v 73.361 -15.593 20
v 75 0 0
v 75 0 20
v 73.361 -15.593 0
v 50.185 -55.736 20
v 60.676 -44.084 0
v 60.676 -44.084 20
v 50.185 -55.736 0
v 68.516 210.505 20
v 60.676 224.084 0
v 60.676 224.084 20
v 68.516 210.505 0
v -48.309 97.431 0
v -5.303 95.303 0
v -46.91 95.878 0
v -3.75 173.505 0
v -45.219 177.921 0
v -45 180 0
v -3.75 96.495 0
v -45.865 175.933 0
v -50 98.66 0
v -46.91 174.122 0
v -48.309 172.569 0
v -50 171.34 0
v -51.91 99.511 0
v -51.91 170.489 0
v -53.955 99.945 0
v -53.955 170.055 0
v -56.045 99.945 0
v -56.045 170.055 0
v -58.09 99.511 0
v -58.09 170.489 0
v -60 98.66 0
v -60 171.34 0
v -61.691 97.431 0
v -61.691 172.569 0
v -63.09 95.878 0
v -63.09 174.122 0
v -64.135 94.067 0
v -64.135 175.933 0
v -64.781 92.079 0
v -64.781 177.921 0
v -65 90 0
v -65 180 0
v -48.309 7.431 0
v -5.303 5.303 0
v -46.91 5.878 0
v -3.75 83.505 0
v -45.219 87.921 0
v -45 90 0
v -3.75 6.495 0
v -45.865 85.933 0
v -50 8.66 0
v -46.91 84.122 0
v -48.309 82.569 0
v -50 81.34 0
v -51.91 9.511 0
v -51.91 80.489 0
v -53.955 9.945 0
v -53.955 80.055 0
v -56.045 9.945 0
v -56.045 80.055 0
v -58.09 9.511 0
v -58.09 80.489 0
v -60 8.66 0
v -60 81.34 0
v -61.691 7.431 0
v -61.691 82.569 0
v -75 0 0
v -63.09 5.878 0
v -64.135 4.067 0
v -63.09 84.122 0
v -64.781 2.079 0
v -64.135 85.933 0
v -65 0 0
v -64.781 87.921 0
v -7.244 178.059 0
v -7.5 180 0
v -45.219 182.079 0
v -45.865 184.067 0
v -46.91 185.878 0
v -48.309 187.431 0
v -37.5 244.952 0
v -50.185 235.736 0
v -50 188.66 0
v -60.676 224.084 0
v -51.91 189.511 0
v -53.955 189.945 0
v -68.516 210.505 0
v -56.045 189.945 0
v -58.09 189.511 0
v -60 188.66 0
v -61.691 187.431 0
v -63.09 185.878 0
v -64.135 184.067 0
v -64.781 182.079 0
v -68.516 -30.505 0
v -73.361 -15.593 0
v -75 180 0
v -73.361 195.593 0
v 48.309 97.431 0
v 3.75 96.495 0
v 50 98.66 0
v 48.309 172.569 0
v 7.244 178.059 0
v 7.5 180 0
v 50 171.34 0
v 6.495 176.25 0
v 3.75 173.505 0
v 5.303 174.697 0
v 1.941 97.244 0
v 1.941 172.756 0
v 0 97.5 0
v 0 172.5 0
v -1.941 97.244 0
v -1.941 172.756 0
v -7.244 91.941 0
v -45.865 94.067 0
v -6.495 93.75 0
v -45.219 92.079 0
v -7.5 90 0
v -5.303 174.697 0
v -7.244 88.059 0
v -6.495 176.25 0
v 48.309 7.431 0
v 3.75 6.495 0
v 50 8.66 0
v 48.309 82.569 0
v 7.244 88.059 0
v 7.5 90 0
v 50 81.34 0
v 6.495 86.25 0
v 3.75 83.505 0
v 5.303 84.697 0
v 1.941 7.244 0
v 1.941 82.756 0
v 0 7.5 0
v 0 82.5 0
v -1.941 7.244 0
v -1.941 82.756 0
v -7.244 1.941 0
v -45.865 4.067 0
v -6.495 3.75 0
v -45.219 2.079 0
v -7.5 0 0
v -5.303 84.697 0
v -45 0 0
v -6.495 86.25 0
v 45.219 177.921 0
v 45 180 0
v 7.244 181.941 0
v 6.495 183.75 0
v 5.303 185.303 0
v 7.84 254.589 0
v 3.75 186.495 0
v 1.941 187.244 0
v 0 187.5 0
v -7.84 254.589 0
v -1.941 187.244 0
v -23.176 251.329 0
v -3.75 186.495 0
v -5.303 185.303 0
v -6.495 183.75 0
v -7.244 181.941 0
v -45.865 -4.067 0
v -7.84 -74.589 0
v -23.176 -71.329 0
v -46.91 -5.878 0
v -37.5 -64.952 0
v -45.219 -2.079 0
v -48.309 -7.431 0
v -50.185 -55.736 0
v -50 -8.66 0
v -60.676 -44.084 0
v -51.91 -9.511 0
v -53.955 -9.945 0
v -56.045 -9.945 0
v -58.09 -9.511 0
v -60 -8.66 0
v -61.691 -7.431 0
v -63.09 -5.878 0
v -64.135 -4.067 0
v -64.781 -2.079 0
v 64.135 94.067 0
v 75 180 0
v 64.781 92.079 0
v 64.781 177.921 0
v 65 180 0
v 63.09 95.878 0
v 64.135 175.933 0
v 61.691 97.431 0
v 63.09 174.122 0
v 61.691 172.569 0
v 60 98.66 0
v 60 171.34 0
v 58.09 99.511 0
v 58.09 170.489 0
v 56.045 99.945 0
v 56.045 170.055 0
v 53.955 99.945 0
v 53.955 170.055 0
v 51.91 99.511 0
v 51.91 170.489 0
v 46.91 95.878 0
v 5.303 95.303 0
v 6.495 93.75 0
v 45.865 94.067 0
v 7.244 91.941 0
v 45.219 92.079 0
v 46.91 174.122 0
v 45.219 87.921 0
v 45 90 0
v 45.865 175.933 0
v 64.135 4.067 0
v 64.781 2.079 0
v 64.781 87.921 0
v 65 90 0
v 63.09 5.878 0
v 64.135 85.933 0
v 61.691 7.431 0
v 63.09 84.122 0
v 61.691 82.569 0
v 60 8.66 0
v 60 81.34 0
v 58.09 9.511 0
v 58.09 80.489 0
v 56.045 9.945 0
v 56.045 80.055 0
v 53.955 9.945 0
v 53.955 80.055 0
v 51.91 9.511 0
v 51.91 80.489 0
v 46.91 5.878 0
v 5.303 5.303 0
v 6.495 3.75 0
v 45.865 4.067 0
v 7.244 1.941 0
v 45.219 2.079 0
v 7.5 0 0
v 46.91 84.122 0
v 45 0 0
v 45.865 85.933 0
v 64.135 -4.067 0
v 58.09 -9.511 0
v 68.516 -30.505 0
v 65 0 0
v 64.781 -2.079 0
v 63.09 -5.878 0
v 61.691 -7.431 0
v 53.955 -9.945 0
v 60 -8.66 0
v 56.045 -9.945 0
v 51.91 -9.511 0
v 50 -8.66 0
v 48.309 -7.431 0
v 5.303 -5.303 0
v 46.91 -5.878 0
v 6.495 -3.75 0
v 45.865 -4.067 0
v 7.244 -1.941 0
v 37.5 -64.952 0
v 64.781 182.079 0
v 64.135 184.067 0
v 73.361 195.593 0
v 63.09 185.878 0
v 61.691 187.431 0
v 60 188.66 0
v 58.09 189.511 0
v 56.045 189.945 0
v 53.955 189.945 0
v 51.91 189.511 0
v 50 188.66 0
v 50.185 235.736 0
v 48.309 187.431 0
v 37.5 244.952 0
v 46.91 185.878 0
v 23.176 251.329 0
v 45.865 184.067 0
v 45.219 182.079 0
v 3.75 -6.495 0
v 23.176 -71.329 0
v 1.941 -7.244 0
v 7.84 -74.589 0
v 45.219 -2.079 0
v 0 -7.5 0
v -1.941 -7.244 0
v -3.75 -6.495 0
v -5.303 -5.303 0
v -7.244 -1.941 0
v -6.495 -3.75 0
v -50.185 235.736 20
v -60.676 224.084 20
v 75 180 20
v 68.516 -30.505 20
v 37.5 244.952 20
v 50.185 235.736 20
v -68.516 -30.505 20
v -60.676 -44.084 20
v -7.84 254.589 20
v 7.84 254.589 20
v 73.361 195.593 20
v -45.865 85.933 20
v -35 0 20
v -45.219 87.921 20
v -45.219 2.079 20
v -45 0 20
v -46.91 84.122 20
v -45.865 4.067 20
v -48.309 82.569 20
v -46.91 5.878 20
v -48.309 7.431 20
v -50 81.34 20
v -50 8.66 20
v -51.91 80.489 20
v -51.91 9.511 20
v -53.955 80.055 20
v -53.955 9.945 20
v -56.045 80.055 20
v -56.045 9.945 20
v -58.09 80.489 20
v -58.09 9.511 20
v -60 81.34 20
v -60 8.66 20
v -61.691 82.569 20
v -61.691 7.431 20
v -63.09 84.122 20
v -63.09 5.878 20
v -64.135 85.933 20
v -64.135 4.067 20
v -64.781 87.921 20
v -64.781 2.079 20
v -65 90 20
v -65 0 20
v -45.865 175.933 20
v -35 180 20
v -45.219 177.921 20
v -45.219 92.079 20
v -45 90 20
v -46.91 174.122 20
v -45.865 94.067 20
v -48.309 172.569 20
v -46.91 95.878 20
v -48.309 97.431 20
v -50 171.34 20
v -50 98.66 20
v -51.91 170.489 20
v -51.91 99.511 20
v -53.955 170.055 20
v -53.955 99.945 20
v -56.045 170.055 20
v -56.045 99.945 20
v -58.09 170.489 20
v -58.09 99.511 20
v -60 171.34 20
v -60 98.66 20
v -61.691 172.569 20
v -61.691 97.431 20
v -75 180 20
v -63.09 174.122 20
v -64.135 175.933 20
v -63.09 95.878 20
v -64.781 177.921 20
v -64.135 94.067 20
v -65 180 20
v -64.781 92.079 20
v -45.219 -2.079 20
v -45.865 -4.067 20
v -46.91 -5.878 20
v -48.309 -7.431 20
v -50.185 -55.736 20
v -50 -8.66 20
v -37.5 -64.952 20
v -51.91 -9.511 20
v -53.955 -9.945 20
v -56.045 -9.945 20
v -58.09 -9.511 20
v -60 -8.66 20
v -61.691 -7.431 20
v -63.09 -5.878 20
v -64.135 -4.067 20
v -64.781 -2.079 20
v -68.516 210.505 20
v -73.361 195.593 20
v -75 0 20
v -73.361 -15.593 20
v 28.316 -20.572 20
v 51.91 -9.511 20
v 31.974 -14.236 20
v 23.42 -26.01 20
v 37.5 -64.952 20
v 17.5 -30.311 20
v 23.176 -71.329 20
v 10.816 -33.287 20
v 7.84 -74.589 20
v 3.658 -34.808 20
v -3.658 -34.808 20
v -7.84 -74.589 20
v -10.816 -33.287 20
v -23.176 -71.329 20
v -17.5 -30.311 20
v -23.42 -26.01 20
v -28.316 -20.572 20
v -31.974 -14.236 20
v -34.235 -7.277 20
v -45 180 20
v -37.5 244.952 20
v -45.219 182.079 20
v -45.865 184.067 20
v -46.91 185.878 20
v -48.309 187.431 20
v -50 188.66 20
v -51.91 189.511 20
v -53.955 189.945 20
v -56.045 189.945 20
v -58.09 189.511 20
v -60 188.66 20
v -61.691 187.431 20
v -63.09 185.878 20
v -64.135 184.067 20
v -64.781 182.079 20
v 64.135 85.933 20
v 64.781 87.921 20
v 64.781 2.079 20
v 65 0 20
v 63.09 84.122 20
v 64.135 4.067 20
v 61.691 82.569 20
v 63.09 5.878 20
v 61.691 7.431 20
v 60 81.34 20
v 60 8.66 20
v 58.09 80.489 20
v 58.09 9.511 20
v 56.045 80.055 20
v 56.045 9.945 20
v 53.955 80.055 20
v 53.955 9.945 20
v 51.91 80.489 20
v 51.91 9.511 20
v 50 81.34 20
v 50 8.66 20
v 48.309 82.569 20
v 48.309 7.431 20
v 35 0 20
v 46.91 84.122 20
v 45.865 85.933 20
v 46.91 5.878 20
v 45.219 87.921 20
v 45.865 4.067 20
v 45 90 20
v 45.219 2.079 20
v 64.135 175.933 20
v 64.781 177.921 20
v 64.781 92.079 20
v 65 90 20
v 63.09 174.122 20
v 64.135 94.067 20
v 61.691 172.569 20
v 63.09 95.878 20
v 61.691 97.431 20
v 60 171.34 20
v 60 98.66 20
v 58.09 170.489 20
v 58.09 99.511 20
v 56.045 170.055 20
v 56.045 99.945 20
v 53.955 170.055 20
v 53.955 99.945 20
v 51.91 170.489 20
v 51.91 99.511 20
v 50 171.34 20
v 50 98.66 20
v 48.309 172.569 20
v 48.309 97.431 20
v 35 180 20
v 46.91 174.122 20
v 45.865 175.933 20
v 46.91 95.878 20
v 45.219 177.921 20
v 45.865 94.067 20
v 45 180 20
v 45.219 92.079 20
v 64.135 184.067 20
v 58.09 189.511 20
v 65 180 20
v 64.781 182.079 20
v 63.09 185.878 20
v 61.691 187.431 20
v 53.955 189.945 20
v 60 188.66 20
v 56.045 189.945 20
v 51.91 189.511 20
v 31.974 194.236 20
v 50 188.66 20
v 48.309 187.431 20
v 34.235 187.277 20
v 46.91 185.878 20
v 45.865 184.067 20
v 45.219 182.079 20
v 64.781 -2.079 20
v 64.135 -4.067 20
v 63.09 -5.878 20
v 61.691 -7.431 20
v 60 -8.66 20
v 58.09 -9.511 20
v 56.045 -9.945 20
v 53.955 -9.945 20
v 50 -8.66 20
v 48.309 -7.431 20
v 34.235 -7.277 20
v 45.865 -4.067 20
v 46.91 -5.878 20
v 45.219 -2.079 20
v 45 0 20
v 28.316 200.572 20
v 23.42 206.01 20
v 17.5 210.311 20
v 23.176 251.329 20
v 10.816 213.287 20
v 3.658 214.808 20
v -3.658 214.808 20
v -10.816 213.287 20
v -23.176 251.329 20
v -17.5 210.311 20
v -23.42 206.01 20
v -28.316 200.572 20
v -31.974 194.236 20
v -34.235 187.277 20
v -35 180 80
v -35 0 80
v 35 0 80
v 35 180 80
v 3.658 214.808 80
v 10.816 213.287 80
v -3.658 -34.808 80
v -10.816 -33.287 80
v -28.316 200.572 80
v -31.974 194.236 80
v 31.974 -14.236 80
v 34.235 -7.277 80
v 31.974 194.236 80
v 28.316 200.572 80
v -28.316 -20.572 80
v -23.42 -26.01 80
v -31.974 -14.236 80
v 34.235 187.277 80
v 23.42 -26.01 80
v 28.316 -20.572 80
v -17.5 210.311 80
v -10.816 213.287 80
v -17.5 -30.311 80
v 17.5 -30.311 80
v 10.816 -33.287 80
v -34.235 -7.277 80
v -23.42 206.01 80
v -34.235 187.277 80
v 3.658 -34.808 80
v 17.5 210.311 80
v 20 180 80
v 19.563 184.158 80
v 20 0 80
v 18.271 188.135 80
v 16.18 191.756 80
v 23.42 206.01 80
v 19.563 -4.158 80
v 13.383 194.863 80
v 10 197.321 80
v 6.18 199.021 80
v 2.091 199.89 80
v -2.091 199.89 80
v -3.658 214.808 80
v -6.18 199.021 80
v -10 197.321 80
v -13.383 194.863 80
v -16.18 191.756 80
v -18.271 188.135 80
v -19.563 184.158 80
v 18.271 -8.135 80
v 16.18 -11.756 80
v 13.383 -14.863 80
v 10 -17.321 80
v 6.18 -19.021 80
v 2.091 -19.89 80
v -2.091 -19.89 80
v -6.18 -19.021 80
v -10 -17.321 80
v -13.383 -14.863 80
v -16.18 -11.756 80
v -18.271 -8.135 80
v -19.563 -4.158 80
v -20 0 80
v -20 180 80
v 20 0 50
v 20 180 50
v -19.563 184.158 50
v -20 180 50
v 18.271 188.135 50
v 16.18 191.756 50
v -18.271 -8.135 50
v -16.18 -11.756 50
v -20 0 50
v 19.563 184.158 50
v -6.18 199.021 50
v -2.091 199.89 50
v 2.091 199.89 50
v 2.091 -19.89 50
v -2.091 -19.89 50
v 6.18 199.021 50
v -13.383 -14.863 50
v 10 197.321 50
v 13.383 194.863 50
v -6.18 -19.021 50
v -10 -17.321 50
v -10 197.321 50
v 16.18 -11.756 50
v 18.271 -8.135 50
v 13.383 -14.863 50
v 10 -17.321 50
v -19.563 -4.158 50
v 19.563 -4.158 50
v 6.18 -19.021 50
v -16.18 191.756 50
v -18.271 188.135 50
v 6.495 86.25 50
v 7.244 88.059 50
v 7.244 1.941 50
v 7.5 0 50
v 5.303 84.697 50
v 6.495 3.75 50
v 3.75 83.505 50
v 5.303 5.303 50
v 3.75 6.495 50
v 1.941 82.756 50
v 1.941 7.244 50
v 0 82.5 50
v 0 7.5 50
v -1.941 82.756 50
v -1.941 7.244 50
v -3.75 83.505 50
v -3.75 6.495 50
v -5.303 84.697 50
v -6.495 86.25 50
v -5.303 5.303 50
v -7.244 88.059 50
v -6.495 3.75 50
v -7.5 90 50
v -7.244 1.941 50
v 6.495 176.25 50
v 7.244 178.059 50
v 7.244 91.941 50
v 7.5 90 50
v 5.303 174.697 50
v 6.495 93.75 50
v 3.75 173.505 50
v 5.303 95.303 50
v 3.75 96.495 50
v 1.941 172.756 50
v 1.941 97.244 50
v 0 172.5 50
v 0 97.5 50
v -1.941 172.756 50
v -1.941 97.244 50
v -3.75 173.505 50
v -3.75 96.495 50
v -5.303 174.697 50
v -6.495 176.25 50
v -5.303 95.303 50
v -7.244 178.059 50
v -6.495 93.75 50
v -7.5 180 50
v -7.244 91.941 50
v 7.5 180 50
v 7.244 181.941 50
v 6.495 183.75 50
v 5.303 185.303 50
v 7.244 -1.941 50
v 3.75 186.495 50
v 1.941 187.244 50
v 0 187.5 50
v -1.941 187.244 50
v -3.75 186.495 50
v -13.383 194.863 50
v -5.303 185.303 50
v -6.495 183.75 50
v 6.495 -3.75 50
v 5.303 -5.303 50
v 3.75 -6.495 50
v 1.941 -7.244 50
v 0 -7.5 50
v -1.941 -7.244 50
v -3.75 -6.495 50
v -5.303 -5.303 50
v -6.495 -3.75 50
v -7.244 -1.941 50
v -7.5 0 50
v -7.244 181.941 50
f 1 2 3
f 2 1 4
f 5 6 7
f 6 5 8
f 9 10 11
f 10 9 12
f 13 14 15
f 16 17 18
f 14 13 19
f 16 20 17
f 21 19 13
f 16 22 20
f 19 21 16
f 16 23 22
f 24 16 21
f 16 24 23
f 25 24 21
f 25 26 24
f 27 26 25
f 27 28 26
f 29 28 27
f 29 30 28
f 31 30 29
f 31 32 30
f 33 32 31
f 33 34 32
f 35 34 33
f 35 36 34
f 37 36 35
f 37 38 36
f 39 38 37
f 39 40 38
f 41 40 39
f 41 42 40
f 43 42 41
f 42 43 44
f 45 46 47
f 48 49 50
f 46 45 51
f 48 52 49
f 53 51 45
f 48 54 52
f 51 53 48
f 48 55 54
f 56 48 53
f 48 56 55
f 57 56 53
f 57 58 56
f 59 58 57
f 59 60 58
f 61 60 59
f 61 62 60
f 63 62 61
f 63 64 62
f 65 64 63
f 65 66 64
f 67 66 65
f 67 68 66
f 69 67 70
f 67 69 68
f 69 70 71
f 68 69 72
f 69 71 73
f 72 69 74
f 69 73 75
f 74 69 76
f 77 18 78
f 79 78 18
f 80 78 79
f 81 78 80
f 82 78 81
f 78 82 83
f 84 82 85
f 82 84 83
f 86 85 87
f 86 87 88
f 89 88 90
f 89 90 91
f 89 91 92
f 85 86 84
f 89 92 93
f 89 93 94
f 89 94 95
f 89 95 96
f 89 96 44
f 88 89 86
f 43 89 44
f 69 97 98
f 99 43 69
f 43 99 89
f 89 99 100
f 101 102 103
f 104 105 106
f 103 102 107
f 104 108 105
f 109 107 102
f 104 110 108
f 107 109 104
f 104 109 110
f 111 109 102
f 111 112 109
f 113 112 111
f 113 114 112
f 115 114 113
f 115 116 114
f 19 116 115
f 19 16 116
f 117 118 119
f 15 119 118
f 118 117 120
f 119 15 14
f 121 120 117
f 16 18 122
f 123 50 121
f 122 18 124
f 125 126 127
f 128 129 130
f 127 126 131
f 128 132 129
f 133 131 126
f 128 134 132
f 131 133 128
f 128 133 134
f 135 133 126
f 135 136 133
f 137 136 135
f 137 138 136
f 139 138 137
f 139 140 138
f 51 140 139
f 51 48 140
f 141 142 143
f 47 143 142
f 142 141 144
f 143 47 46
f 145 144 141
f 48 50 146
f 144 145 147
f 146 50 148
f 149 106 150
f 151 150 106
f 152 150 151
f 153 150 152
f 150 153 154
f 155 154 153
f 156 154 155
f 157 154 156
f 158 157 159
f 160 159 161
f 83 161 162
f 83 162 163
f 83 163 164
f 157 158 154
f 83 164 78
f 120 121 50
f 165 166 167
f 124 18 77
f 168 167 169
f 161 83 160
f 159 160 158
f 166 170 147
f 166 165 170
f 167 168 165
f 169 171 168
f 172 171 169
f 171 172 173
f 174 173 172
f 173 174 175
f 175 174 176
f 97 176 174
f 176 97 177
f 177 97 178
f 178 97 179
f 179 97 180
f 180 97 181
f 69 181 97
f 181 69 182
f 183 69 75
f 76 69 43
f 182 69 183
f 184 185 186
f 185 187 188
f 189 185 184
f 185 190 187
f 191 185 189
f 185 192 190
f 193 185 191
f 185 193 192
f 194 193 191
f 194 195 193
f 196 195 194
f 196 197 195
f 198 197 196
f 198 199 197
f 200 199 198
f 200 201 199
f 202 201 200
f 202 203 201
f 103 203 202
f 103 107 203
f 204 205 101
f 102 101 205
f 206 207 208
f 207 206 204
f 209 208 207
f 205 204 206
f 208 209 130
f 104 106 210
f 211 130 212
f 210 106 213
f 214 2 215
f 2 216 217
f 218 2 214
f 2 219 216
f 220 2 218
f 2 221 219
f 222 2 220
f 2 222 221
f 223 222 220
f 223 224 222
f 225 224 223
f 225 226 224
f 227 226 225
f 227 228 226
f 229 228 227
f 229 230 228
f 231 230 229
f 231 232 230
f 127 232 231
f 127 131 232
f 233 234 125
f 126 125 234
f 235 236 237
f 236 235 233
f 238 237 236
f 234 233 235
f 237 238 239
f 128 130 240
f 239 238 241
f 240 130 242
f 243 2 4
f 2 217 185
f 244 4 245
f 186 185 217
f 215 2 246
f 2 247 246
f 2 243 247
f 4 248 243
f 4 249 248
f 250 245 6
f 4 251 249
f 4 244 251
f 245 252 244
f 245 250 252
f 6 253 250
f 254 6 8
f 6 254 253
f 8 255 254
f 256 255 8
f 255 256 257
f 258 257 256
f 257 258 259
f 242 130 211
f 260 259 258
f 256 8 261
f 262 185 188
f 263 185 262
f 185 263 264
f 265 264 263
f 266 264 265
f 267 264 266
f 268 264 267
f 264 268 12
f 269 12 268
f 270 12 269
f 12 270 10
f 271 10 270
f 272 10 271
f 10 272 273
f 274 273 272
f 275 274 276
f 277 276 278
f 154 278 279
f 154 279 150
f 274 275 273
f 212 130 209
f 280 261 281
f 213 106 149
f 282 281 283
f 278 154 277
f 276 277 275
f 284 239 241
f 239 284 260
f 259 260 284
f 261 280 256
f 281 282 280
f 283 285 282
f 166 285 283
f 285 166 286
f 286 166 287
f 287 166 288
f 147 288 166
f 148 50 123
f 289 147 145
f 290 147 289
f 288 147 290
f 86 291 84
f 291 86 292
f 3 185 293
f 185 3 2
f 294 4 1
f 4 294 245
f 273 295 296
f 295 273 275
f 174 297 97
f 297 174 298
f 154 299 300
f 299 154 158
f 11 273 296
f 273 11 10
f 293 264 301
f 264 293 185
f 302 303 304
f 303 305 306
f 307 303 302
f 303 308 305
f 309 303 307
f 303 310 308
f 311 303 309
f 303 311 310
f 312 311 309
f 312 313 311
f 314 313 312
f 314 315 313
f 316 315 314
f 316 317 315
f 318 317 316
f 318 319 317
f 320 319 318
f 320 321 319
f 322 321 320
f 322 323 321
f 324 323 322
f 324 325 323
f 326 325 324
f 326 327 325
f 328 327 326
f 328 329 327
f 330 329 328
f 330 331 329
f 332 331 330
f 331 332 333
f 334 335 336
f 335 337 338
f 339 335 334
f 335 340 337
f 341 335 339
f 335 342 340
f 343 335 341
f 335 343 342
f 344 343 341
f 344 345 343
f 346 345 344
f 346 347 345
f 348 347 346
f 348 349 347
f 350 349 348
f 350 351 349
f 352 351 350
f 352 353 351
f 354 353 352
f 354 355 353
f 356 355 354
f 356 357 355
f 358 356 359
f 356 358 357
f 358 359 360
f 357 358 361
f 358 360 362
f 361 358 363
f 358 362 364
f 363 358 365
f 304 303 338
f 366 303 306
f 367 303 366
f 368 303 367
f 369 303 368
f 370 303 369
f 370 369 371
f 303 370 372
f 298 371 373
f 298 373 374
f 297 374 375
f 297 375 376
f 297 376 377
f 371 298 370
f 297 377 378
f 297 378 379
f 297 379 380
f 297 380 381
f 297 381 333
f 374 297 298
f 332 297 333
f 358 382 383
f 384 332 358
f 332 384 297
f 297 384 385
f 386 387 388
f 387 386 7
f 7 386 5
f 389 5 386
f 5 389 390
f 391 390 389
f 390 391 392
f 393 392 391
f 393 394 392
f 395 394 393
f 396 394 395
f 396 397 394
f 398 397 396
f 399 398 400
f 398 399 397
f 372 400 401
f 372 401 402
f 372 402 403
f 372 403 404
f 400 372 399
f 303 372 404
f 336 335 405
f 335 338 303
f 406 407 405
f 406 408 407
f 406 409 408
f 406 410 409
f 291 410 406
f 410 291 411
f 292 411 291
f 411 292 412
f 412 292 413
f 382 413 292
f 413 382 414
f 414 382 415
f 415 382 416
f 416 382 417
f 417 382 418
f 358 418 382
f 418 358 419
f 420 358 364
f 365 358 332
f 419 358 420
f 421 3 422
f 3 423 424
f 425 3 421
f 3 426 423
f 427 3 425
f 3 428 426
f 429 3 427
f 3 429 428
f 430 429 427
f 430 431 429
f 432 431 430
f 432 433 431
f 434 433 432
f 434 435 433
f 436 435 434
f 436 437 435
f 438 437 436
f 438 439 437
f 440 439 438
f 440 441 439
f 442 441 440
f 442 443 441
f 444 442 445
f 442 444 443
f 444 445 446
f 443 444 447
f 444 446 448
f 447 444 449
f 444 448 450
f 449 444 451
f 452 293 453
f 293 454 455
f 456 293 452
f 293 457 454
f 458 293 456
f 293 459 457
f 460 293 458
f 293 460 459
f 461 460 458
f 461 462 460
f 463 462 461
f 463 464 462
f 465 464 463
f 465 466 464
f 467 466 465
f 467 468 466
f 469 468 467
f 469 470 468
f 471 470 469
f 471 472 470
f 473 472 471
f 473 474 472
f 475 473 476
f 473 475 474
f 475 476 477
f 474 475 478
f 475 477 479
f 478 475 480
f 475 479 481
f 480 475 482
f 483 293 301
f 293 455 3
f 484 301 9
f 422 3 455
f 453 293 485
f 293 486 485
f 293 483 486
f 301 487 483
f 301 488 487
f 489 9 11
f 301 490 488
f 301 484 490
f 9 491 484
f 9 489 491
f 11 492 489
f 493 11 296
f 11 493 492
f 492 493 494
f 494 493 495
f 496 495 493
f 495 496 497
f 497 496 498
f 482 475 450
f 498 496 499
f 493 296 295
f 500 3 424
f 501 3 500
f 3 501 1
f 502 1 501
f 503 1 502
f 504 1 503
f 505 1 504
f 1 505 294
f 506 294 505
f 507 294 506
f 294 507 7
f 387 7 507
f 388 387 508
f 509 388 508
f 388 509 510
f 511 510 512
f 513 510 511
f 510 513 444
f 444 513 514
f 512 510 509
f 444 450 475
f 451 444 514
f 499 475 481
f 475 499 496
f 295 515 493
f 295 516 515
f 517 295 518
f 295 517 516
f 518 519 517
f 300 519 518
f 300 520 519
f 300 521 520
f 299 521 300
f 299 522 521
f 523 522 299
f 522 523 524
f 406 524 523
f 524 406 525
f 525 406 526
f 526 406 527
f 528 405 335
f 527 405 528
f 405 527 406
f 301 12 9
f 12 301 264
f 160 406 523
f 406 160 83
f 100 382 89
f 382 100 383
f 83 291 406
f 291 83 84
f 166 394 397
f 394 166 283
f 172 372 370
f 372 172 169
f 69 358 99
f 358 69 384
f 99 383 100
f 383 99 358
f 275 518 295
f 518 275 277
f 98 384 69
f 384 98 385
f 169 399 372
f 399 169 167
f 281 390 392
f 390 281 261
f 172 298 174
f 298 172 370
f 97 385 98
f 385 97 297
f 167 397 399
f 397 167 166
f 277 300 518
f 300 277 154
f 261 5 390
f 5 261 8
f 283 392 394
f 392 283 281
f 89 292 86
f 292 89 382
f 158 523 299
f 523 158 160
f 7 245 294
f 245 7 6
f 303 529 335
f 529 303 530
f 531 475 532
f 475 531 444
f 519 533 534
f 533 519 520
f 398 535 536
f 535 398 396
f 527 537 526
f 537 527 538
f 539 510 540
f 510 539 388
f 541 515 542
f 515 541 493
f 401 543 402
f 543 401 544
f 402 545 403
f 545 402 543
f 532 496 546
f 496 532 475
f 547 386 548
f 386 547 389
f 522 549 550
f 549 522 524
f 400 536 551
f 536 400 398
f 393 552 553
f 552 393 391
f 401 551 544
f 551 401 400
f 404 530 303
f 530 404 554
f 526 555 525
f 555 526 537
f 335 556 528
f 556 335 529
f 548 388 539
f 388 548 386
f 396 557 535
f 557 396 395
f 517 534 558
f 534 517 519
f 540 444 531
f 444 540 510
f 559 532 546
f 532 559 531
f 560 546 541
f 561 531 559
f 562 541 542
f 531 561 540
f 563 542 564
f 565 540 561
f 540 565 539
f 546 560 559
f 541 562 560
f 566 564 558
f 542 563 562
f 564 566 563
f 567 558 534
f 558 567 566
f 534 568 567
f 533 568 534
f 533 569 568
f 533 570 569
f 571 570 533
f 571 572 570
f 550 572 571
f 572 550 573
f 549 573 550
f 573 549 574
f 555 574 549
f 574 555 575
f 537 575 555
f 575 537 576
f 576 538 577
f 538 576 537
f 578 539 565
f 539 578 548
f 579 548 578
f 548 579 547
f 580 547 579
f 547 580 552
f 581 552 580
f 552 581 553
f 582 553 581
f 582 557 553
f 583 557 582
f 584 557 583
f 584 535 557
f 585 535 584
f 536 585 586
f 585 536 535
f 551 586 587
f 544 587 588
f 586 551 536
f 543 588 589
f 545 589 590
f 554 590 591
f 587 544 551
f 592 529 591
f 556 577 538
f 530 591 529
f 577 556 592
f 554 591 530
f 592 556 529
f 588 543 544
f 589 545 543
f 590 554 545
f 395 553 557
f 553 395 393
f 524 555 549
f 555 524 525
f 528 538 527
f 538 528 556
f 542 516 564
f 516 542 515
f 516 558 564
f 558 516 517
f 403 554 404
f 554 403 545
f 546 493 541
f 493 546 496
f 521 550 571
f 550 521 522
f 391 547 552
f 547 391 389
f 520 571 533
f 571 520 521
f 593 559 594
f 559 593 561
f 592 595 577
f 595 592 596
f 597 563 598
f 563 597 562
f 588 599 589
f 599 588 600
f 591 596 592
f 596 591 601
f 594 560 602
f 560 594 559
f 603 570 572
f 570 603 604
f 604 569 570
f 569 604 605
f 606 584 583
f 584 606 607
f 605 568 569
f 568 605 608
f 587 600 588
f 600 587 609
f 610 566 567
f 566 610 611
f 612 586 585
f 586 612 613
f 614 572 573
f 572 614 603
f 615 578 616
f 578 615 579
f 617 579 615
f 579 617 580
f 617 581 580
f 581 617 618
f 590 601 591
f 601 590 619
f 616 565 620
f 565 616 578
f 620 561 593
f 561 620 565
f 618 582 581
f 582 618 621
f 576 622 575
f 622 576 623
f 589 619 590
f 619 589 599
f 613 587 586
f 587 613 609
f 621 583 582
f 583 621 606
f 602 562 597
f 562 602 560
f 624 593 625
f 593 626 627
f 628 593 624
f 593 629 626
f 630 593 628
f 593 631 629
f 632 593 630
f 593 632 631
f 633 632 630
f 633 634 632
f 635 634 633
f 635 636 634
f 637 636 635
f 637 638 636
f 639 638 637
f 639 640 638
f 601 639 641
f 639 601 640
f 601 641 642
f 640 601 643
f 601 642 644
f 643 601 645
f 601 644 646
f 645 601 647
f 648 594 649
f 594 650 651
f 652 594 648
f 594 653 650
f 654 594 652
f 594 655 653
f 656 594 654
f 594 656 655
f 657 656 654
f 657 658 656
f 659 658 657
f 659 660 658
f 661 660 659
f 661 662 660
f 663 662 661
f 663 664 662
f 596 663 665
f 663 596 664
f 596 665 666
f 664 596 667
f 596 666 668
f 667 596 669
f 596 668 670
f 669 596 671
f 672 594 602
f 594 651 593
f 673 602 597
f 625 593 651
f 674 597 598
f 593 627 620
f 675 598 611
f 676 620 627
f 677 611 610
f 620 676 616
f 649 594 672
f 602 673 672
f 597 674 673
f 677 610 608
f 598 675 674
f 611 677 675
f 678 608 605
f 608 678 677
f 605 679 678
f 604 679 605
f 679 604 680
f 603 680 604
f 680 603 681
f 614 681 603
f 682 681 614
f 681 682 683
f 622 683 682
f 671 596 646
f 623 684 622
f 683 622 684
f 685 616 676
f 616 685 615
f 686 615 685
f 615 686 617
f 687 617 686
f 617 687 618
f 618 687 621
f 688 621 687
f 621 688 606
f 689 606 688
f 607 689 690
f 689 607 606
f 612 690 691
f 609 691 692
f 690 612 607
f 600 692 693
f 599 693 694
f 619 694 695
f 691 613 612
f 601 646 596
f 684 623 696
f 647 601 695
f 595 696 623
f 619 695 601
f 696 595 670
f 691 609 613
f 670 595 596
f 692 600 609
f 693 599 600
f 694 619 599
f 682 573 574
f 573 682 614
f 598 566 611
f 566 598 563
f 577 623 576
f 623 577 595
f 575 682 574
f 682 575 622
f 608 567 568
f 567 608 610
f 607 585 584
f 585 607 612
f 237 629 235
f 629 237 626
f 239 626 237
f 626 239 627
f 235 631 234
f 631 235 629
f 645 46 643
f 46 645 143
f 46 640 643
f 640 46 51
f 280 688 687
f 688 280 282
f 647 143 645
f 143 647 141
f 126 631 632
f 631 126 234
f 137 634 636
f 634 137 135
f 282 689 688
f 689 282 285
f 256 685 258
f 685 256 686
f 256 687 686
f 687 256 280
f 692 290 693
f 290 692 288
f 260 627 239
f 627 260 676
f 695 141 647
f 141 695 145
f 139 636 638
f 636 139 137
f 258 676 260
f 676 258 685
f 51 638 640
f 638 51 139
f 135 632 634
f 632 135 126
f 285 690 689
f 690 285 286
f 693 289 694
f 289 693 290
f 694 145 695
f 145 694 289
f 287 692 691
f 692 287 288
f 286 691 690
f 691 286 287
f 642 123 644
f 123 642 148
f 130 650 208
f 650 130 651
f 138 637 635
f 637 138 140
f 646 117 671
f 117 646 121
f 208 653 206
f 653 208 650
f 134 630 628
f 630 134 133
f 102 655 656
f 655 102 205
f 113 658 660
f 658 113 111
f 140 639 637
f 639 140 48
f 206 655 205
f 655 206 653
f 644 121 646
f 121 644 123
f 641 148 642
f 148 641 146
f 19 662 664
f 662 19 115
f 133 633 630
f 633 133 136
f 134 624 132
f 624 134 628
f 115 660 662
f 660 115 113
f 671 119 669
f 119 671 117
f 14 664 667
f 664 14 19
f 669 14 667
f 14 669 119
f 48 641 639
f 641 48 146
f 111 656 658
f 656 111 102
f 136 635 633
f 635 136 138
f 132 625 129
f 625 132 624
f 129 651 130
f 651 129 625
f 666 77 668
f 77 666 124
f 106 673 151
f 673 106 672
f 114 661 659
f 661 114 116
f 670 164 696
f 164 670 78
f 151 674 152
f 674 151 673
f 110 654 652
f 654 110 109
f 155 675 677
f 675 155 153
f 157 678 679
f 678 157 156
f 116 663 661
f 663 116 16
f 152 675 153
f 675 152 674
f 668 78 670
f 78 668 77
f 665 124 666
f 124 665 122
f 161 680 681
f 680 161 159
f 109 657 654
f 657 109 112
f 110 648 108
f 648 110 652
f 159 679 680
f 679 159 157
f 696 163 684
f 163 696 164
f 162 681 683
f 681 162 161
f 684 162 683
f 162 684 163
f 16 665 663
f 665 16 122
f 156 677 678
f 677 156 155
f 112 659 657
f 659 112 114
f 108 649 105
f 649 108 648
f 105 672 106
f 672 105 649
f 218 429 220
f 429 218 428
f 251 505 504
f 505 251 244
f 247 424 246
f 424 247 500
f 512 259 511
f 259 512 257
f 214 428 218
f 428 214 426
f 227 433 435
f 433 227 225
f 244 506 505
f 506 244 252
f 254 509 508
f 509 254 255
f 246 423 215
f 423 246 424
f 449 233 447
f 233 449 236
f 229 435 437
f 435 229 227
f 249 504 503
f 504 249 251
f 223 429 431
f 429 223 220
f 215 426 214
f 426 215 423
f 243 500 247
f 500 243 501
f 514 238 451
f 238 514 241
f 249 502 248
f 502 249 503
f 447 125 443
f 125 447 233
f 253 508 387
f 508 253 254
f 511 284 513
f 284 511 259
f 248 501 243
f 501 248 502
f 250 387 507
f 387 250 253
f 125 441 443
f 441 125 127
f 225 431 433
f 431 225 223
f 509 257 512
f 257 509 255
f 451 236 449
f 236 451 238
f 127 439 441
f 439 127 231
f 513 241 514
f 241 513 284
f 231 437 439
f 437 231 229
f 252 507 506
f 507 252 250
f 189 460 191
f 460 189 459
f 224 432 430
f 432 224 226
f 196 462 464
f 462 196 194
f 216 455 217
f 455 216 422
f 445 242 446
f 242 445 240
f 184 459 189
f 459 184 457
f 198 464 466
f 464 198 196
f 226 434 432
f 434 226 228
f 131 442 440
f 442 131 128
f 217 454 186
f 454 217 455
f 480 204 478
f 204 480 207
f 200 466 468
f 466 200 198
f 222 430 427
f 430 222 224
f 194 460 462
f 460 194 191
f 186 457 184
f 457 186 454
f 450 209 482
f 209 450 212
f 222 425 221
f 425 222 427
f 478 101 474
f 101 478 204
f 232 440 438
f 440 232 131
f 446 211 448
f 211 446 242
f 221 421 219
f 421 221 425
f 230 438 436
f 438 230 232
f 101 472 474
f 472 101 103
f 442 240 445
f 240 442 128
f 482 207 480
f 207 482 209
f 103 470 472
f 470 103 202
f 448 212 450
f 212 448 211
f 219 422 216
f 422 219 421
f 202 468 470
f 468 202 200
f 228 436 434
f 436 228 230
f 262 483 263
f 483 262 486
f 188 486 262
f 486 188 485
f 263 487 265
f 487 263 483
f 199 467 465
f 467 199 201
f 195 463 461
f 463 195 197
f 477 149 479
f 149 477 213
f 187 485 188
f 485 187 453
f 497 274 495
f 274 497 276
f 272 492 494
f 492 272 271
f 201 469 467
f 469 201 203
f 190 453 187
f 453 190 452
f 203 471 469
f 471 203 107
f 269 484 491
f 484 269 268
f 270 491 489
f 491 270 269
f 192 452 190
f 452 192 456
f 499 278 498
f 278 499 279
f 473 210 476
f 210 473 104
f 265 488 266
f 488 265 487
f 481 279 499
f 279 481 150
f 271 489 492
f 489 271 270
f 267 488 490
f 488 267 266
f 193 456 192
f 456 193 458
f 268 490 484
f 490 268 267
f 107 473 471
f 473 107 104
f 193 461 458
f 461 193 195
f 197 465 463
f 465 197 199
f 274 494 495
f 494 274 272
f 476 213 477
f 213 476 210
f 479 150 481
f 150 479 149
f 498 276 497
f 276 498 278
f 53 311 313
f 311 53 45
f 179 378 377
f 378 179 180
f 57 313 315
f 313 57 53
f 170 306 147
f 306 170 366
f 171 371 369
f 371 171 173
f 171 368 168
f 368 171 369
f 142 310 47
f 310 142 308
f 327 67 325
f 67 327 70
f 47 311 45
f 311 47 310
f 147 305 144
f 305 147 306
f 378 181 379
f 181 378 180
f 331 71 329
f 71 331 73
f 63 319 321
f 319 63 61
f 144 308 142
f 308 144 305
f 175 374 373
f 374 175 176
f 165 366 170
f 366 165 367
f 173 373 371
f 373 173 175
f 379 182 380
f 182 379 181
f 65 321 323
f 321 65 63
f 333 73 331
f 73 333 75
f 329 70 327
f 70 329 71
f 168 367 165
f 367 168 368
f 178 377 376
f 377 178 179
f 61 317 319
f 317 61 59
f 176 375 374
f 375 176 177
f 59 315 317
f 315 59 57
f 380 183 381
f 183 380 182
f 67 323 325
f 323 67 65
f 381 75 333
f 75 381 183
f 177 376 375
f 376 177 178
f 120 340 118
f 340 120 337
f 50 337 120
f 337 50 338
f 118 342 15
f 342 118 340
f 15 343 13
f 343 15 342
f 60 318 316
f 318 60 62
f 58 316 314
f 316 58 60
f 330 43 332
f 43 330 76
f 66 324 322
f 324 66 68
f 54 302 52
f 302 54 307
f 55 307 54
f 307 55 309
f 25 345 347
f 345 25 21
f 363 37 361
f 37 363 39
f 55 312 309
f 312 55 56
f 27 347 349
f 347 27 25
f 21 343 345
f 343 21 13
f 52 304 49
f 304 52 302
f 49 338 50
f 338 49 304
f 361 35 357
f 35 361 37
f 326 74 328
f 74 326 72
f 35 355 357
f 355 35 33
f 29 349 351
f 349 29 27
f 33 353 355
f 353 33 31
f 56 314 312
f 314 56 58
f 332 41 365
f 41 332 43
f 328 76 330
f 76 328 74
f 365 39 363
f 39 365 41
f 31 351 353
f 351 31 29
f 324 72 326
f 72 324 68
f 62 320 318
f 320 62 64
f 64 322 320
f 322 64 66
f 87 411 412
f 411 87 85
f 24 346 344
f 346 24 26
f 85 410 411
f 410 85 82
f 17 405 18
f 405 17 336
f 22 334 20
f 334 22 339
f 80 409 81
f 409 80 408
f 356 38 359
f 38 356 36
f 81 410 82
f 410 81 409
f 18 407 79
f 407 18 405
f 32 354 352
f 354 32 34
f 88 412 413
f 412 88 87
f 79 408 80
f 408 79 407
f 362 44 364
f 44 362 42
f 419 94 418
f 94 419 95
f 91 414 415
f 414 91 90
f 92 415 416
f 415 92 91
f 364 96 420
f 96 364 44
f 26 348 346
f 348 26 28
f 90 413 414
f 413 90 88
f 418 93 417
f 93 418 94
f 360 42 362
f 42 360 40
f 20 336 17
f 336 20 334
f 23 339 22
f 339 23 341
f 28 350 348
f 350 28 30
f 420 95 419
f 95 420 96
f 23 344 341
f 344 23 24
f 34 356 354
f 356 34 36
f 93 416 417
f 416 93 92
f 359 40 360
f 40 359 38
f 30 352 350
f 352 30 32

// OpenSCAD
basecylinderRadius = 75;
basecylinderDepth = 20;
partLengthCtoC = 180;

chungeussHeight = 60;
chungeussRadius = 35;
chungeussOffset = basecylinderDepth ;

offTheTopChungusCutRadius = 20;
cutOffTheTopCylinder = basecylinderDepth  + chungeussHeight - 30;

totalHeightCylCut = basecylinderDepth  + chungeussHeight;
chungeussDiameter = 15;
middleCylCutHole = partLengthCtoC / 2;
TandBtotalLength = 110;

mountChungeussDiameter = 20;


//main code
difference(){  
  union(){
    hull(){

        cylinder(basecylinderDepth, r = basecylinderRadius);
        
        translate([0, partLengthCtoC, 0])
        cylinder(basecylinderDepth, r = basecylinderRadius);
    }

    hull(){

        translate([ 0, 0, chungeussOffset])
        cylinder(chungeussHeight, r = chungeussRadius);
        
        translate([ 0, partLengthCtoC, chungeussOffset])
        cylinder(chungeussHeight, r = chungeussRadius);
    }
}
 hull(){

        translate([ 0, 0, cutOffTheTopCylinder])
        cylinder(chungeussHeight, r = offTheTopChungusCutRadius);
        
        translate([ 0, partLengthCtoC, cutOffTheTopCylinder])
        cylinder(chungeussHeight, r = offTheTopChungusCutRadius);
 }

//The center three cylinders---------------------------------
    cylinder(chungeussHeight, d = chungeussDiameter);
    
    translate([0, middleCylCutHole, 0])
    cylinder(chungeussHeight, d = chungeussDiameter);
    
    translate([0, middleCylCutHole * 2, 0])
    cylinder(chungeussHeight, d = chungeussDiameter);
 //---------------------------------------------------------
 //The + X offset three cylinders---------------------------------
     translate([TandBtotalLength / 2, 0, 0])
     cylinder(chungeussHeight, d = mountChungeussDiameter);
    
    translate([TandBtotalLength / 2, middleCylCutHole, 0])
    cylinder(chungeussHeight, d = mountChungeussDiameter);
    
    translate([TandBtotalLength / 2, middleCylCutHole * 2, 0])
    cylinder(chungeussHeight, d = mountChungeussDiameter);
 //---------------------------------------------------------------
  //The  X offset three cylinders---------------------------------
     translate([-TandBtotalLength / 2, 0, 0])
     cylinder(chungeussHeight, d = mountChungeussDiameter);
    
    translate([-TandBtotalLength / 2, middleCylCutHole, 0])
    cylinder(chungeussHeight, d = mountChungeussDiameter);
    
    translate([-TandBtotalLength / 2, middleCylCutHole * 2, 0])
    cylinder(chungeussHeight, d = mountChungeussDiameter);
 //---------------------------------------------------------------
}
